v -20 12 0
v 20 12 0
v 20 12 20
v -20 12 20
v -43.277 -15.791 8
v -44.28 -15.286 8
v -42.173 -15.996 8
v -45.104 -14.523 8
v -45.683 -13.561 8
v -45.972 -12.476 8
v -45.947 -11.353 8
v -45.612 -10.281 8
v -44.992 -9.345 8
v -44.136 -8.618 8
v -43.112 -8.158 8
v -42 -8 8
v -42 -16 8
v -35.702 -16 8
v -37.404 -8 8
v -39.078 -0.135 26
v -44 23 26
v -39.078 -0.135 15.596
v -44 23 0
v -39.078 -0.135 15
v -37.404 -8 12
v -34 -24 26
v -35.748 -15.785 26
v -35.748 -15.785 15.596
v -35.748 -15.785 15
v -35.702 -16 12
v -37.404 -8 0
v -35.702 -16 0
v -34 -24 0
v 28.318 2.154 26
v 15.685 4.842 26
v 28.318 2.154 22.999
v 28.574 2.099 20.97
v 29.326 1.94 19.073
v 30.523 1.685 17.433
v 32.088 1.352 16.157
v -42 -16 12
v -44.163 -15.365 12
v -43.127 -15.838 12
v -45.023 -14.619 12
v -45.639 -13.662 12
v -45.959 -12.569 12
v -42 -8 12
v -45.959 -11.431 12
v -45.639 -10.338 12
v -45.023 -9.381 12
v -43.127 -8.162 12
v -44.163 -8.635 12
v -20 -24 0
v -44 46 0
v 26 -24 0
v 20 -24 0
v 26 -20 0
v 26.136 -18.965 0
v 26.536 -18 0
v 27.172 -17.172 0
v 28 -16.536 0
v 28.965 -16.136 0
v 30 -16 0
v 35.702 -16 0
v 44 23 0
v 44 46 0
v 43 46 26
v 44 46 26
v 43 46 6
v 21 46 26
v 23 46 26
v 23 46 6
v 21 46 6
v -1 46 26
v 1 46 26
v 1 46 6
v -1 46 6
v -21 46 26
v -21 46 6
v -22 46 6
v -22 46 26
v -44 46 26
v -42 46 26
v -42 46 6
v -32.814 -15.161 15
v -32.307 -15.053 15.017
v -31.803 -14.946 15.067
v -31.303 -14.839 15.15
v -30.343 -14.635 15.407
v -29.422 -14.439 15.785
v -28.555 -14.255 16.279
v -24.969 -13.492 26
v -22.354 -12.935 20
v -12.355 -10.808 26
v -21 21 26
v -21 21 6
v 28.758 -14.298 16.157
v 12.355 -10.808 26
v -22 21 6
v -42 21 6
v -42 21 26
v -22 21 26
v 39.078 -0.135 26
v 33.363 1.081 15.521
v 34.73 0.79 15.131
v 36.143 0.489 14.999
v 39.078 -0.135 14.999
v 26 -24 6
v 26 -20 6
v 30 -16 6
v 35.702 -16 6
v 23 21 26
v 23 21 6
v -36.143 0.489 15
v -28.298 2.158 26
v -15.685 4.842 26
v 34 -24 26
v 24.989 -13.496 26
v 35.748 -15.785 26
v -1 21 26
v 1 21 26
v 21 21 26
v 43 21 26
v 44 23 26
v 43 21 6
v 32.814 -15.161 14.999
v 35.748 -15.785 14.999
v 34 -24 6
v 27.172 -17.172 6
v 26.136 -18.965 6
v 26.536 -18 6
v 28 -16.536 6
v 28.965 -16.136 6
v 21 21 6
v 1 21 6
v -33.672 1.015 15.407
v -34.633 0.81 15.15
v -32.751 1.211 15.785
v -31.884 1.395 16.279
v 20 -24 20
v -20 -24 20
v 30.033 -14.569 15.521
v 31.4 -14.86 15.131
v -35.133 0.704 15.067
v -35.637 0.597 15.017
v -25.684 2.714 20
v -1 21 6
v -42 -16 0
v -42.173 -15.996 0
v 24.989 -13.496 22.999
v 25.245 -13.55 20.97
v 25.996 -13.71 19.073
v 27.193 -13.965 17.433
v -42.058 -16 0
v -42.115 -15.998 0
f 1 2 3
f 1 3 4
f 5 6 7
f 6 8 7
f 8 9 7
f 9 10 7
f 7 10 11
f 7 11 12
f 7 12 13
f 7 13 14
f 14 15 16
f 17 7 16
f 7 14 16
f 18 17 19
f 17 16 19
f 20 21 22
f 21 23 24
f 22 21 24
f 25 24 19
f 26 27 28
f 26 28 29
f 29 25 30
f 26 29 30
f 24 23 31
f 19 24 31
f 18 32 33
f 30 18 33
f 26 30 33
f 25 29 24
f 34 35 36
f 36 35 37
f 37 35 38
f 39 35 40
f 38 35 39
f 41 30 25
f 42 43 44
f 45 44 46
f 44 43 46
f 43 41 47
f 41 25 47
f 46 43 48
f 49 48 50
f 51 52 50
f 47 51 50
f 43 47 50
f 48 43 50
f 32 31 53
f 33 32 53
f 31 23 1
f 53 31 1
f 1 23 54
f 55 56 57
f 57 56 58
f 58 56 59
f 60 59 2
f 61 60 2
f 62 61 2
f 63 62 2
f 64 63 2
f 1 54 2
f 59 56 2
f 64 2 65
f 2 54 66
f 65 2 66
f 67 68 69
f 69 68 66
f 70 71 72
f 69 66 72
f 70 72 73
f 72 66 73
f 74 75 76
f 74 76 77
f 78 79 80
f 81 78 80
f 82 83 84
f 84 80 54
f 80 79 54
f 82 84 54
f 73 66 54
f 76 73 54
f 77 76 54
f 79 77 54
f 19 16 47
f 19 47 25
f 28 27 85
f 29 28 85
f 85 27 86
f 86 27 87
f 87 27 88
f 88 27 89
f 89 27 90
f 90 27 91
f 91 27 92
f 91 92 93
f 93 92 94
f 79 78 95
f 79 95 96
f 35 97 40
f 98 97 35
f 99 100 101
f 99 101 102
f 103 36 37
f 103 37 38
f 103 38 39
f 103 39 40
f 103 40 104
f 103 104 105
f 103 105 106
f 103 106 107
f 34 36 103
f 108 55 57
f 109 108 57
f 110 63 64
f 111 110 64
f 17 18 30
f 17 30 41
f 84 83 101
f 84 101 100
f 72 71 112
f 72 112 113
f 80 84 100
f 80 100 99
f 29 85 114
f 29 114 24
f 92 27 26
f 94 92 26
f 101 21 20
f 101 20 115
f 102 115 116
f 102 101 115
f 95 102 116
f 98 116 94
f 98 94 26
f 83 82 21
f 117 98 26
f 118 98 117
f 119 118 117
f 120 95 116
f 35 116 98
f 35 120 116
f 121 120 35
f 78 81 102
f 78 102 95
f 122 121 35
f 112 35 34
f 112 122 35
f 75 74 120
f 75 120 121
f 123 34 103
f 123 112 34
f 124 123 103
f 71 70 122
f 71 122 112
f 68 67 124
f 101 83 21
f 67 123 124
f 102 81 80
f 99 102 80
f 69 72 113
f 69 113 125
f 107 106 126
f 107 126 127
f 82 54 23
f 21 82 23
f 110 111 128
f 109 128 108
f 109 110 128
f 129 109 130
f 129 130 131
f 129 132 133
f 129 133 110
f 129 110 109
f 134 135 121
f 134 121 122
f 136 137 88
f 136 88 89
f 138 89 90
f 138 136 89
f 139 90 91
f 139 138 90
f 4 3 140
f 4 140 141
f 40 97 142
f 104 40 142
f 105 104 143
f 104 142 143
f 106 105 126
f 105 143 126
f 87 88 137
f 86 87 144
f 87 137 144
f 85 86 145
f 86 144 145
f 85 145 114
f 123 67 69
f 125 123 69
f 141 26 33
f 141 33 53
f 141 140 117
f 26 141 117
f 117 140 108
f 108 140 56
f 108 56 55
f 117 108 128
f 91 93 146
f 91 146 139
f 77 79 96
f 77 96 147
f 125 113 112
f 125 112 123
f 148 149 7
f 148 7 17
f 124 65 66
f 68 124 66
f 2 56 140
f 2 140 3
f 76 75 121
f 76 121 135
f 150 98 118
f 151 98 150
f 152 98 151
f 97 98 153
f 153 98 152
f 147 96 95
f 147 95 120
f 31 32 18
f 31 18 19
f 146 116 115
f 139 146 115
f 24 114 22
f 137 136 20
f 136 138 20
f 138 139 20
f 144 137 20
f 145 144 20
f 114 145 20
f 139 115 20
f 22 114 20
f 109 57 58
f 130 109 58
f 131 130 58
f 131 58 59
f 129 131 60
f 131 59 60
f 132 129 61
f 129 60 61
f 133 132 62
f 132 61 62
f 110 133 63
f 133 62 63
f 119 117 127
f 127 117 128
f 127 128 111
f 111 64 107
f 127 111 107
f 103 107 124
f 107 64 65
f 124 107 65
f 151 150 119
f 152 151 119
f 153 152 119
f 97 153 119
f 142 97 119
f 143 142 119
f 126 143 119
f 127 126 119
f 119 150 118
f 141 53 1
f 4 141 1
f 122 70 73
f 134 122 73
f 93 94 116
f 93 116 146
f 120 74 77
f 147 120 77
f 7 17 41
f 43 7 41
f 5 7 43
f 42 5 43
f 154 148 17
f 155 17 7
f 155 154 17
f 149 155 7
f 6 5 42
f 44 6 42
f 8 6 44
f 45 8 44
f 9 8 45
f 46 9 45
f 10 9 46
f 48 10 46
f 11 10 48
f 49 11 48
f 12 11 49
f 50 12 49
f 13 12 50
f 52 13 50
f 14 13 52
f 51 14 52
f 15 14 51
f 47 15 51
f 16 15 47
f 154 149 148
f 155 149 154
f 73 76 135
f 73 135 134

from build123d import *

# Parameters (mm, degrees)
EXTRUDE_1_DEPTH      = 26
SKETCH_3_W           = 40
SKETCH_3_H           = 36
CUT_EXTRUDE_4_DEPTH  = 20
SKETCH_4_W           = 20
SKETCH_4_H           = 20
CUT_EXTRUDE_5_DEPTH  = 25
CUT_EXTRUDE_3_DEPTH  = 8
CUT_EXTRUDE_6_DEPTH  = 8
CUT_EXTRUDE_7_DEPTH  = 16
CUT_EXTRUDE_8_DEPTH  = 16
CUT_EXTRUDE_10_DEPTH = 6
EXTRUDE_3_DEPTH      = 12
CUT_EXTRUDE_11_DEPTH = 8


with BuildPart() as part:
    # 草图1 → 凸台-拉伸1 (new body)
    with BuildSketch(Plane.XY):
        Polygon((-34, -24), (34, -24), (44, 23), (44, 46), (-44, 46), (-44, 23), align=None)
    extrude(amount=EXTRUDE_1_DEPTH)

    # 草图3 → 切除-拉伸4 (cut)
    with BuildSketch(Plane(origin=(0, 0, 0), x_dir=(-1, 0, 0), z_dir=(0, 0, -1))):
        with Locations((0, -6)):
            Rectangle(SKETCH_3_W, SKETCH_3_H)
    extrude(amount=-CUT_EXTRUDE_4_DEPTH, mode=Mode.SUBTRACT)

    # 草图4 → 切除-拉伸5 (cut)
    with BuildSketch(Plane(origin=(0, 46, 0), x_dir=(1, 0, 0), z_dir=(0, 1, 0))):
        with Locations((33, -16)):
            Rectangle(SKETCH_4_W, SKETCH_4_H)
        with Locations((11, -16)):
            Rectangle(SKETCH_4_W, SKETCH_4_H)
        with Locations((-11, -16)):
            Rectangle(SKETCH_4_W, SKETCH_4_H)
        with Locations((-32, -16)):
            Rectangle(SKETCH_4_W, SKETCH_4_H)
    extrude(amount=-CUT_EXTRUDE_5_DEPTH, mode=Mode.SUBTRACT)

    # Sketch 3D_5 → 切除-拉伸3 (cut, symmetric)
    with BuildSketch(Plane(origin=(-26.633413551, -5.666683734, 23.004025099), x_dir=(-0.691625335103945, -0.14715432661786076, 0.7071067811865475), z_dir=(-0.2081076444648591, 0.9781059289848354, 0))):
        with BuildLine():
            Line((0, 0), (5.656854249, 5.656854249))
            Line((5.656854249, 5.656854249), (11.313708499, 0))
            ThreePointArc((11.313708499, 0), (5.656854249, -13.656854249), (0, 0))
        make_face()
    extrude(amount=CUT_EXTRUDE_3_DEPTH, both=True, mode=Mode.SUBTRACT)

    # Sketch 3D_6 → 切除-拉伸6 (cut, symmetric)
    with BuildSketch(Plane(origin=(34.478414998, -7.335832978, 14.99907516), x_dir=(0.5895982688198705, -0.12544644017993214, 0.7978954016979886), z_dir=(-0.20810764446495697, -0.9781059289848145, -6.6559639472978385e-12))):
        with BuildLine():
            Line((0, 0), (6.376045072, -8.439700449))
            Line((6.376045072, -8.439700449), (17.547318622, 0))
            Line((17.547318622, 0), (11.17127355, 8.439700449))
            Line((11.17127355, 8.439700449), (6.348906145, 14.822863662))
            Line((6.348906145, 14.822863662), (1.560795809, 11.205530619))
            ThreePointArc((1.560795809, 11.205530619), (-1.540343474, 5.926016705), (0, 0))
        make_face()
    extrude(amount=CUT_EXTRUDE_6_DEPTH, both=True, mode=Mode.SUBTRACT)

    # 草图7 → 切除-拉伸7 (cut)
    with BuildSketch(Plane(origin=(-1.664861156, 7.824847432, 0), x_dir=(0.9781059289848355, 0.2081076444648587, 0), z_dir=(0.2081076444648587, -0.9781059289848355, 0))):
        with BuildLine():
            Line((-24.556702047, 20), (-31.200844281, 16.10051891))
            ThreePointArc((-31.200844281, 16.10051891), (-33.152072653, 15.280030806), (-35.250185053, 15))
            Line((-35.250185053, 15), (-43.250185053, 15))
            Line((-43.250185053, 15), (-43.250185053, 23))
            ThreePointArc((-43.250185053, 23), (-40.3181561, 29.189965223), (-33.671267687, 30.842641134))
            Line((-33.671267687, 30.842641134), (-10.087245225, 28.492198282))
            Line((-10.087245225, 28.492198282), (-24.556702047, 20))
        make_face()
    extrude(amount=CUT_EXTRUDE_7_DEPTH, mode=Mode.SUBTRACT)

    # 草图11 → 切除-拉伸8 (cut)
    with BuildSketch(Plane(origin=(-1.664861156, -7.824847432, 0), x_dir=(0.9781059289845859, -0.2081076444660318, -1.1269708570671002e-12), z_dir=(0.20810764446603178, 0.9781059289845858, 5.296763028184159e-12))):
        with BuildLine():
            Line((31.200844283, -16.100518909), (14.333584528, -26))
            Line((14.333584528, -26), (32.666556858, -30.571318601))
            ThreePointArc((32.666556858, -30.571318601), (42.196349228, -26.968728166), (40.460809076, -16.92962956))
            Line((40.460809076, -16.92962956), (38.250185053, -14.99907516))
            Line((38.250185053, -14.99907516), (35.250185053, -15))
            ThreePointArc((35.250185053, -15), (33.152072655, -15.280030806), (31.200844283, -16.100518909))
        make_face()
    extrude(amount=CUT_EXTRUDE_8_DEPTH, mode=Mode.SUBTRACT)

    # 草图12 → 切除-拉伸10 (cut)
    with BuildSketch(Plane(origin=(0, 0, 0), x_dir=(-1, 0, 0), z_dir=(0, 0, -1))):
        with BuildLine():
            Line((-34, -24), (-26, -24))
            Line((-26, -24), (-26, -20))
            ThreePointArc((-26, -20), (-27.171572875, -17.171572875), (-30, -16))
            Line((-30, -16), (-34, -16))
            Line((-34, -16), (-39.007185212, -16))
            Line((-39.007185212, -16), (-39.007185212, -24))
            Line((-39.007185212, -24), (-34, -24))
        make_face()
    extrude(amount=-CUT_EXTRUDE_10_DEPTH, mode=Mode.SUBTRACT)

    # 草图13 → 凸台-拉伸3 (add)
    with BuildSketch(Plane(origin=(0, 0, 0), x_dir=(-1, 0, 0), z_dir=(0, 0, -1))):
        with BuildLine():
            Line((34, -16), (42, -16))
            ThreePointArc((42, -16), (46, -12), (42, -8))
            Line((42, -8), (38, -8))
            Line((38, -8), (34, -8))
            Line((34, -8), (34, -16))
        make_face()
    extrude(amount=-EXTRUDE_3_DEPTH)

    # 草图14 → 切除-拉伸11 (cut)
    with BuildSketch(Plane(origin=(0, 0, 0), x_dir=(-1, 0, 0), z_dir=(0, 0, -1))):
        Polygon((37.404255319, -8), (51.058505752, -8), (50.951803073, -15.80656107), (42, -16), (35.70212766, -16), align=None)
    extrude(amount=-CUT_EXTRUDE_11_DEPTH, mode=Mode.SUBTRACT)


solid = part.part
